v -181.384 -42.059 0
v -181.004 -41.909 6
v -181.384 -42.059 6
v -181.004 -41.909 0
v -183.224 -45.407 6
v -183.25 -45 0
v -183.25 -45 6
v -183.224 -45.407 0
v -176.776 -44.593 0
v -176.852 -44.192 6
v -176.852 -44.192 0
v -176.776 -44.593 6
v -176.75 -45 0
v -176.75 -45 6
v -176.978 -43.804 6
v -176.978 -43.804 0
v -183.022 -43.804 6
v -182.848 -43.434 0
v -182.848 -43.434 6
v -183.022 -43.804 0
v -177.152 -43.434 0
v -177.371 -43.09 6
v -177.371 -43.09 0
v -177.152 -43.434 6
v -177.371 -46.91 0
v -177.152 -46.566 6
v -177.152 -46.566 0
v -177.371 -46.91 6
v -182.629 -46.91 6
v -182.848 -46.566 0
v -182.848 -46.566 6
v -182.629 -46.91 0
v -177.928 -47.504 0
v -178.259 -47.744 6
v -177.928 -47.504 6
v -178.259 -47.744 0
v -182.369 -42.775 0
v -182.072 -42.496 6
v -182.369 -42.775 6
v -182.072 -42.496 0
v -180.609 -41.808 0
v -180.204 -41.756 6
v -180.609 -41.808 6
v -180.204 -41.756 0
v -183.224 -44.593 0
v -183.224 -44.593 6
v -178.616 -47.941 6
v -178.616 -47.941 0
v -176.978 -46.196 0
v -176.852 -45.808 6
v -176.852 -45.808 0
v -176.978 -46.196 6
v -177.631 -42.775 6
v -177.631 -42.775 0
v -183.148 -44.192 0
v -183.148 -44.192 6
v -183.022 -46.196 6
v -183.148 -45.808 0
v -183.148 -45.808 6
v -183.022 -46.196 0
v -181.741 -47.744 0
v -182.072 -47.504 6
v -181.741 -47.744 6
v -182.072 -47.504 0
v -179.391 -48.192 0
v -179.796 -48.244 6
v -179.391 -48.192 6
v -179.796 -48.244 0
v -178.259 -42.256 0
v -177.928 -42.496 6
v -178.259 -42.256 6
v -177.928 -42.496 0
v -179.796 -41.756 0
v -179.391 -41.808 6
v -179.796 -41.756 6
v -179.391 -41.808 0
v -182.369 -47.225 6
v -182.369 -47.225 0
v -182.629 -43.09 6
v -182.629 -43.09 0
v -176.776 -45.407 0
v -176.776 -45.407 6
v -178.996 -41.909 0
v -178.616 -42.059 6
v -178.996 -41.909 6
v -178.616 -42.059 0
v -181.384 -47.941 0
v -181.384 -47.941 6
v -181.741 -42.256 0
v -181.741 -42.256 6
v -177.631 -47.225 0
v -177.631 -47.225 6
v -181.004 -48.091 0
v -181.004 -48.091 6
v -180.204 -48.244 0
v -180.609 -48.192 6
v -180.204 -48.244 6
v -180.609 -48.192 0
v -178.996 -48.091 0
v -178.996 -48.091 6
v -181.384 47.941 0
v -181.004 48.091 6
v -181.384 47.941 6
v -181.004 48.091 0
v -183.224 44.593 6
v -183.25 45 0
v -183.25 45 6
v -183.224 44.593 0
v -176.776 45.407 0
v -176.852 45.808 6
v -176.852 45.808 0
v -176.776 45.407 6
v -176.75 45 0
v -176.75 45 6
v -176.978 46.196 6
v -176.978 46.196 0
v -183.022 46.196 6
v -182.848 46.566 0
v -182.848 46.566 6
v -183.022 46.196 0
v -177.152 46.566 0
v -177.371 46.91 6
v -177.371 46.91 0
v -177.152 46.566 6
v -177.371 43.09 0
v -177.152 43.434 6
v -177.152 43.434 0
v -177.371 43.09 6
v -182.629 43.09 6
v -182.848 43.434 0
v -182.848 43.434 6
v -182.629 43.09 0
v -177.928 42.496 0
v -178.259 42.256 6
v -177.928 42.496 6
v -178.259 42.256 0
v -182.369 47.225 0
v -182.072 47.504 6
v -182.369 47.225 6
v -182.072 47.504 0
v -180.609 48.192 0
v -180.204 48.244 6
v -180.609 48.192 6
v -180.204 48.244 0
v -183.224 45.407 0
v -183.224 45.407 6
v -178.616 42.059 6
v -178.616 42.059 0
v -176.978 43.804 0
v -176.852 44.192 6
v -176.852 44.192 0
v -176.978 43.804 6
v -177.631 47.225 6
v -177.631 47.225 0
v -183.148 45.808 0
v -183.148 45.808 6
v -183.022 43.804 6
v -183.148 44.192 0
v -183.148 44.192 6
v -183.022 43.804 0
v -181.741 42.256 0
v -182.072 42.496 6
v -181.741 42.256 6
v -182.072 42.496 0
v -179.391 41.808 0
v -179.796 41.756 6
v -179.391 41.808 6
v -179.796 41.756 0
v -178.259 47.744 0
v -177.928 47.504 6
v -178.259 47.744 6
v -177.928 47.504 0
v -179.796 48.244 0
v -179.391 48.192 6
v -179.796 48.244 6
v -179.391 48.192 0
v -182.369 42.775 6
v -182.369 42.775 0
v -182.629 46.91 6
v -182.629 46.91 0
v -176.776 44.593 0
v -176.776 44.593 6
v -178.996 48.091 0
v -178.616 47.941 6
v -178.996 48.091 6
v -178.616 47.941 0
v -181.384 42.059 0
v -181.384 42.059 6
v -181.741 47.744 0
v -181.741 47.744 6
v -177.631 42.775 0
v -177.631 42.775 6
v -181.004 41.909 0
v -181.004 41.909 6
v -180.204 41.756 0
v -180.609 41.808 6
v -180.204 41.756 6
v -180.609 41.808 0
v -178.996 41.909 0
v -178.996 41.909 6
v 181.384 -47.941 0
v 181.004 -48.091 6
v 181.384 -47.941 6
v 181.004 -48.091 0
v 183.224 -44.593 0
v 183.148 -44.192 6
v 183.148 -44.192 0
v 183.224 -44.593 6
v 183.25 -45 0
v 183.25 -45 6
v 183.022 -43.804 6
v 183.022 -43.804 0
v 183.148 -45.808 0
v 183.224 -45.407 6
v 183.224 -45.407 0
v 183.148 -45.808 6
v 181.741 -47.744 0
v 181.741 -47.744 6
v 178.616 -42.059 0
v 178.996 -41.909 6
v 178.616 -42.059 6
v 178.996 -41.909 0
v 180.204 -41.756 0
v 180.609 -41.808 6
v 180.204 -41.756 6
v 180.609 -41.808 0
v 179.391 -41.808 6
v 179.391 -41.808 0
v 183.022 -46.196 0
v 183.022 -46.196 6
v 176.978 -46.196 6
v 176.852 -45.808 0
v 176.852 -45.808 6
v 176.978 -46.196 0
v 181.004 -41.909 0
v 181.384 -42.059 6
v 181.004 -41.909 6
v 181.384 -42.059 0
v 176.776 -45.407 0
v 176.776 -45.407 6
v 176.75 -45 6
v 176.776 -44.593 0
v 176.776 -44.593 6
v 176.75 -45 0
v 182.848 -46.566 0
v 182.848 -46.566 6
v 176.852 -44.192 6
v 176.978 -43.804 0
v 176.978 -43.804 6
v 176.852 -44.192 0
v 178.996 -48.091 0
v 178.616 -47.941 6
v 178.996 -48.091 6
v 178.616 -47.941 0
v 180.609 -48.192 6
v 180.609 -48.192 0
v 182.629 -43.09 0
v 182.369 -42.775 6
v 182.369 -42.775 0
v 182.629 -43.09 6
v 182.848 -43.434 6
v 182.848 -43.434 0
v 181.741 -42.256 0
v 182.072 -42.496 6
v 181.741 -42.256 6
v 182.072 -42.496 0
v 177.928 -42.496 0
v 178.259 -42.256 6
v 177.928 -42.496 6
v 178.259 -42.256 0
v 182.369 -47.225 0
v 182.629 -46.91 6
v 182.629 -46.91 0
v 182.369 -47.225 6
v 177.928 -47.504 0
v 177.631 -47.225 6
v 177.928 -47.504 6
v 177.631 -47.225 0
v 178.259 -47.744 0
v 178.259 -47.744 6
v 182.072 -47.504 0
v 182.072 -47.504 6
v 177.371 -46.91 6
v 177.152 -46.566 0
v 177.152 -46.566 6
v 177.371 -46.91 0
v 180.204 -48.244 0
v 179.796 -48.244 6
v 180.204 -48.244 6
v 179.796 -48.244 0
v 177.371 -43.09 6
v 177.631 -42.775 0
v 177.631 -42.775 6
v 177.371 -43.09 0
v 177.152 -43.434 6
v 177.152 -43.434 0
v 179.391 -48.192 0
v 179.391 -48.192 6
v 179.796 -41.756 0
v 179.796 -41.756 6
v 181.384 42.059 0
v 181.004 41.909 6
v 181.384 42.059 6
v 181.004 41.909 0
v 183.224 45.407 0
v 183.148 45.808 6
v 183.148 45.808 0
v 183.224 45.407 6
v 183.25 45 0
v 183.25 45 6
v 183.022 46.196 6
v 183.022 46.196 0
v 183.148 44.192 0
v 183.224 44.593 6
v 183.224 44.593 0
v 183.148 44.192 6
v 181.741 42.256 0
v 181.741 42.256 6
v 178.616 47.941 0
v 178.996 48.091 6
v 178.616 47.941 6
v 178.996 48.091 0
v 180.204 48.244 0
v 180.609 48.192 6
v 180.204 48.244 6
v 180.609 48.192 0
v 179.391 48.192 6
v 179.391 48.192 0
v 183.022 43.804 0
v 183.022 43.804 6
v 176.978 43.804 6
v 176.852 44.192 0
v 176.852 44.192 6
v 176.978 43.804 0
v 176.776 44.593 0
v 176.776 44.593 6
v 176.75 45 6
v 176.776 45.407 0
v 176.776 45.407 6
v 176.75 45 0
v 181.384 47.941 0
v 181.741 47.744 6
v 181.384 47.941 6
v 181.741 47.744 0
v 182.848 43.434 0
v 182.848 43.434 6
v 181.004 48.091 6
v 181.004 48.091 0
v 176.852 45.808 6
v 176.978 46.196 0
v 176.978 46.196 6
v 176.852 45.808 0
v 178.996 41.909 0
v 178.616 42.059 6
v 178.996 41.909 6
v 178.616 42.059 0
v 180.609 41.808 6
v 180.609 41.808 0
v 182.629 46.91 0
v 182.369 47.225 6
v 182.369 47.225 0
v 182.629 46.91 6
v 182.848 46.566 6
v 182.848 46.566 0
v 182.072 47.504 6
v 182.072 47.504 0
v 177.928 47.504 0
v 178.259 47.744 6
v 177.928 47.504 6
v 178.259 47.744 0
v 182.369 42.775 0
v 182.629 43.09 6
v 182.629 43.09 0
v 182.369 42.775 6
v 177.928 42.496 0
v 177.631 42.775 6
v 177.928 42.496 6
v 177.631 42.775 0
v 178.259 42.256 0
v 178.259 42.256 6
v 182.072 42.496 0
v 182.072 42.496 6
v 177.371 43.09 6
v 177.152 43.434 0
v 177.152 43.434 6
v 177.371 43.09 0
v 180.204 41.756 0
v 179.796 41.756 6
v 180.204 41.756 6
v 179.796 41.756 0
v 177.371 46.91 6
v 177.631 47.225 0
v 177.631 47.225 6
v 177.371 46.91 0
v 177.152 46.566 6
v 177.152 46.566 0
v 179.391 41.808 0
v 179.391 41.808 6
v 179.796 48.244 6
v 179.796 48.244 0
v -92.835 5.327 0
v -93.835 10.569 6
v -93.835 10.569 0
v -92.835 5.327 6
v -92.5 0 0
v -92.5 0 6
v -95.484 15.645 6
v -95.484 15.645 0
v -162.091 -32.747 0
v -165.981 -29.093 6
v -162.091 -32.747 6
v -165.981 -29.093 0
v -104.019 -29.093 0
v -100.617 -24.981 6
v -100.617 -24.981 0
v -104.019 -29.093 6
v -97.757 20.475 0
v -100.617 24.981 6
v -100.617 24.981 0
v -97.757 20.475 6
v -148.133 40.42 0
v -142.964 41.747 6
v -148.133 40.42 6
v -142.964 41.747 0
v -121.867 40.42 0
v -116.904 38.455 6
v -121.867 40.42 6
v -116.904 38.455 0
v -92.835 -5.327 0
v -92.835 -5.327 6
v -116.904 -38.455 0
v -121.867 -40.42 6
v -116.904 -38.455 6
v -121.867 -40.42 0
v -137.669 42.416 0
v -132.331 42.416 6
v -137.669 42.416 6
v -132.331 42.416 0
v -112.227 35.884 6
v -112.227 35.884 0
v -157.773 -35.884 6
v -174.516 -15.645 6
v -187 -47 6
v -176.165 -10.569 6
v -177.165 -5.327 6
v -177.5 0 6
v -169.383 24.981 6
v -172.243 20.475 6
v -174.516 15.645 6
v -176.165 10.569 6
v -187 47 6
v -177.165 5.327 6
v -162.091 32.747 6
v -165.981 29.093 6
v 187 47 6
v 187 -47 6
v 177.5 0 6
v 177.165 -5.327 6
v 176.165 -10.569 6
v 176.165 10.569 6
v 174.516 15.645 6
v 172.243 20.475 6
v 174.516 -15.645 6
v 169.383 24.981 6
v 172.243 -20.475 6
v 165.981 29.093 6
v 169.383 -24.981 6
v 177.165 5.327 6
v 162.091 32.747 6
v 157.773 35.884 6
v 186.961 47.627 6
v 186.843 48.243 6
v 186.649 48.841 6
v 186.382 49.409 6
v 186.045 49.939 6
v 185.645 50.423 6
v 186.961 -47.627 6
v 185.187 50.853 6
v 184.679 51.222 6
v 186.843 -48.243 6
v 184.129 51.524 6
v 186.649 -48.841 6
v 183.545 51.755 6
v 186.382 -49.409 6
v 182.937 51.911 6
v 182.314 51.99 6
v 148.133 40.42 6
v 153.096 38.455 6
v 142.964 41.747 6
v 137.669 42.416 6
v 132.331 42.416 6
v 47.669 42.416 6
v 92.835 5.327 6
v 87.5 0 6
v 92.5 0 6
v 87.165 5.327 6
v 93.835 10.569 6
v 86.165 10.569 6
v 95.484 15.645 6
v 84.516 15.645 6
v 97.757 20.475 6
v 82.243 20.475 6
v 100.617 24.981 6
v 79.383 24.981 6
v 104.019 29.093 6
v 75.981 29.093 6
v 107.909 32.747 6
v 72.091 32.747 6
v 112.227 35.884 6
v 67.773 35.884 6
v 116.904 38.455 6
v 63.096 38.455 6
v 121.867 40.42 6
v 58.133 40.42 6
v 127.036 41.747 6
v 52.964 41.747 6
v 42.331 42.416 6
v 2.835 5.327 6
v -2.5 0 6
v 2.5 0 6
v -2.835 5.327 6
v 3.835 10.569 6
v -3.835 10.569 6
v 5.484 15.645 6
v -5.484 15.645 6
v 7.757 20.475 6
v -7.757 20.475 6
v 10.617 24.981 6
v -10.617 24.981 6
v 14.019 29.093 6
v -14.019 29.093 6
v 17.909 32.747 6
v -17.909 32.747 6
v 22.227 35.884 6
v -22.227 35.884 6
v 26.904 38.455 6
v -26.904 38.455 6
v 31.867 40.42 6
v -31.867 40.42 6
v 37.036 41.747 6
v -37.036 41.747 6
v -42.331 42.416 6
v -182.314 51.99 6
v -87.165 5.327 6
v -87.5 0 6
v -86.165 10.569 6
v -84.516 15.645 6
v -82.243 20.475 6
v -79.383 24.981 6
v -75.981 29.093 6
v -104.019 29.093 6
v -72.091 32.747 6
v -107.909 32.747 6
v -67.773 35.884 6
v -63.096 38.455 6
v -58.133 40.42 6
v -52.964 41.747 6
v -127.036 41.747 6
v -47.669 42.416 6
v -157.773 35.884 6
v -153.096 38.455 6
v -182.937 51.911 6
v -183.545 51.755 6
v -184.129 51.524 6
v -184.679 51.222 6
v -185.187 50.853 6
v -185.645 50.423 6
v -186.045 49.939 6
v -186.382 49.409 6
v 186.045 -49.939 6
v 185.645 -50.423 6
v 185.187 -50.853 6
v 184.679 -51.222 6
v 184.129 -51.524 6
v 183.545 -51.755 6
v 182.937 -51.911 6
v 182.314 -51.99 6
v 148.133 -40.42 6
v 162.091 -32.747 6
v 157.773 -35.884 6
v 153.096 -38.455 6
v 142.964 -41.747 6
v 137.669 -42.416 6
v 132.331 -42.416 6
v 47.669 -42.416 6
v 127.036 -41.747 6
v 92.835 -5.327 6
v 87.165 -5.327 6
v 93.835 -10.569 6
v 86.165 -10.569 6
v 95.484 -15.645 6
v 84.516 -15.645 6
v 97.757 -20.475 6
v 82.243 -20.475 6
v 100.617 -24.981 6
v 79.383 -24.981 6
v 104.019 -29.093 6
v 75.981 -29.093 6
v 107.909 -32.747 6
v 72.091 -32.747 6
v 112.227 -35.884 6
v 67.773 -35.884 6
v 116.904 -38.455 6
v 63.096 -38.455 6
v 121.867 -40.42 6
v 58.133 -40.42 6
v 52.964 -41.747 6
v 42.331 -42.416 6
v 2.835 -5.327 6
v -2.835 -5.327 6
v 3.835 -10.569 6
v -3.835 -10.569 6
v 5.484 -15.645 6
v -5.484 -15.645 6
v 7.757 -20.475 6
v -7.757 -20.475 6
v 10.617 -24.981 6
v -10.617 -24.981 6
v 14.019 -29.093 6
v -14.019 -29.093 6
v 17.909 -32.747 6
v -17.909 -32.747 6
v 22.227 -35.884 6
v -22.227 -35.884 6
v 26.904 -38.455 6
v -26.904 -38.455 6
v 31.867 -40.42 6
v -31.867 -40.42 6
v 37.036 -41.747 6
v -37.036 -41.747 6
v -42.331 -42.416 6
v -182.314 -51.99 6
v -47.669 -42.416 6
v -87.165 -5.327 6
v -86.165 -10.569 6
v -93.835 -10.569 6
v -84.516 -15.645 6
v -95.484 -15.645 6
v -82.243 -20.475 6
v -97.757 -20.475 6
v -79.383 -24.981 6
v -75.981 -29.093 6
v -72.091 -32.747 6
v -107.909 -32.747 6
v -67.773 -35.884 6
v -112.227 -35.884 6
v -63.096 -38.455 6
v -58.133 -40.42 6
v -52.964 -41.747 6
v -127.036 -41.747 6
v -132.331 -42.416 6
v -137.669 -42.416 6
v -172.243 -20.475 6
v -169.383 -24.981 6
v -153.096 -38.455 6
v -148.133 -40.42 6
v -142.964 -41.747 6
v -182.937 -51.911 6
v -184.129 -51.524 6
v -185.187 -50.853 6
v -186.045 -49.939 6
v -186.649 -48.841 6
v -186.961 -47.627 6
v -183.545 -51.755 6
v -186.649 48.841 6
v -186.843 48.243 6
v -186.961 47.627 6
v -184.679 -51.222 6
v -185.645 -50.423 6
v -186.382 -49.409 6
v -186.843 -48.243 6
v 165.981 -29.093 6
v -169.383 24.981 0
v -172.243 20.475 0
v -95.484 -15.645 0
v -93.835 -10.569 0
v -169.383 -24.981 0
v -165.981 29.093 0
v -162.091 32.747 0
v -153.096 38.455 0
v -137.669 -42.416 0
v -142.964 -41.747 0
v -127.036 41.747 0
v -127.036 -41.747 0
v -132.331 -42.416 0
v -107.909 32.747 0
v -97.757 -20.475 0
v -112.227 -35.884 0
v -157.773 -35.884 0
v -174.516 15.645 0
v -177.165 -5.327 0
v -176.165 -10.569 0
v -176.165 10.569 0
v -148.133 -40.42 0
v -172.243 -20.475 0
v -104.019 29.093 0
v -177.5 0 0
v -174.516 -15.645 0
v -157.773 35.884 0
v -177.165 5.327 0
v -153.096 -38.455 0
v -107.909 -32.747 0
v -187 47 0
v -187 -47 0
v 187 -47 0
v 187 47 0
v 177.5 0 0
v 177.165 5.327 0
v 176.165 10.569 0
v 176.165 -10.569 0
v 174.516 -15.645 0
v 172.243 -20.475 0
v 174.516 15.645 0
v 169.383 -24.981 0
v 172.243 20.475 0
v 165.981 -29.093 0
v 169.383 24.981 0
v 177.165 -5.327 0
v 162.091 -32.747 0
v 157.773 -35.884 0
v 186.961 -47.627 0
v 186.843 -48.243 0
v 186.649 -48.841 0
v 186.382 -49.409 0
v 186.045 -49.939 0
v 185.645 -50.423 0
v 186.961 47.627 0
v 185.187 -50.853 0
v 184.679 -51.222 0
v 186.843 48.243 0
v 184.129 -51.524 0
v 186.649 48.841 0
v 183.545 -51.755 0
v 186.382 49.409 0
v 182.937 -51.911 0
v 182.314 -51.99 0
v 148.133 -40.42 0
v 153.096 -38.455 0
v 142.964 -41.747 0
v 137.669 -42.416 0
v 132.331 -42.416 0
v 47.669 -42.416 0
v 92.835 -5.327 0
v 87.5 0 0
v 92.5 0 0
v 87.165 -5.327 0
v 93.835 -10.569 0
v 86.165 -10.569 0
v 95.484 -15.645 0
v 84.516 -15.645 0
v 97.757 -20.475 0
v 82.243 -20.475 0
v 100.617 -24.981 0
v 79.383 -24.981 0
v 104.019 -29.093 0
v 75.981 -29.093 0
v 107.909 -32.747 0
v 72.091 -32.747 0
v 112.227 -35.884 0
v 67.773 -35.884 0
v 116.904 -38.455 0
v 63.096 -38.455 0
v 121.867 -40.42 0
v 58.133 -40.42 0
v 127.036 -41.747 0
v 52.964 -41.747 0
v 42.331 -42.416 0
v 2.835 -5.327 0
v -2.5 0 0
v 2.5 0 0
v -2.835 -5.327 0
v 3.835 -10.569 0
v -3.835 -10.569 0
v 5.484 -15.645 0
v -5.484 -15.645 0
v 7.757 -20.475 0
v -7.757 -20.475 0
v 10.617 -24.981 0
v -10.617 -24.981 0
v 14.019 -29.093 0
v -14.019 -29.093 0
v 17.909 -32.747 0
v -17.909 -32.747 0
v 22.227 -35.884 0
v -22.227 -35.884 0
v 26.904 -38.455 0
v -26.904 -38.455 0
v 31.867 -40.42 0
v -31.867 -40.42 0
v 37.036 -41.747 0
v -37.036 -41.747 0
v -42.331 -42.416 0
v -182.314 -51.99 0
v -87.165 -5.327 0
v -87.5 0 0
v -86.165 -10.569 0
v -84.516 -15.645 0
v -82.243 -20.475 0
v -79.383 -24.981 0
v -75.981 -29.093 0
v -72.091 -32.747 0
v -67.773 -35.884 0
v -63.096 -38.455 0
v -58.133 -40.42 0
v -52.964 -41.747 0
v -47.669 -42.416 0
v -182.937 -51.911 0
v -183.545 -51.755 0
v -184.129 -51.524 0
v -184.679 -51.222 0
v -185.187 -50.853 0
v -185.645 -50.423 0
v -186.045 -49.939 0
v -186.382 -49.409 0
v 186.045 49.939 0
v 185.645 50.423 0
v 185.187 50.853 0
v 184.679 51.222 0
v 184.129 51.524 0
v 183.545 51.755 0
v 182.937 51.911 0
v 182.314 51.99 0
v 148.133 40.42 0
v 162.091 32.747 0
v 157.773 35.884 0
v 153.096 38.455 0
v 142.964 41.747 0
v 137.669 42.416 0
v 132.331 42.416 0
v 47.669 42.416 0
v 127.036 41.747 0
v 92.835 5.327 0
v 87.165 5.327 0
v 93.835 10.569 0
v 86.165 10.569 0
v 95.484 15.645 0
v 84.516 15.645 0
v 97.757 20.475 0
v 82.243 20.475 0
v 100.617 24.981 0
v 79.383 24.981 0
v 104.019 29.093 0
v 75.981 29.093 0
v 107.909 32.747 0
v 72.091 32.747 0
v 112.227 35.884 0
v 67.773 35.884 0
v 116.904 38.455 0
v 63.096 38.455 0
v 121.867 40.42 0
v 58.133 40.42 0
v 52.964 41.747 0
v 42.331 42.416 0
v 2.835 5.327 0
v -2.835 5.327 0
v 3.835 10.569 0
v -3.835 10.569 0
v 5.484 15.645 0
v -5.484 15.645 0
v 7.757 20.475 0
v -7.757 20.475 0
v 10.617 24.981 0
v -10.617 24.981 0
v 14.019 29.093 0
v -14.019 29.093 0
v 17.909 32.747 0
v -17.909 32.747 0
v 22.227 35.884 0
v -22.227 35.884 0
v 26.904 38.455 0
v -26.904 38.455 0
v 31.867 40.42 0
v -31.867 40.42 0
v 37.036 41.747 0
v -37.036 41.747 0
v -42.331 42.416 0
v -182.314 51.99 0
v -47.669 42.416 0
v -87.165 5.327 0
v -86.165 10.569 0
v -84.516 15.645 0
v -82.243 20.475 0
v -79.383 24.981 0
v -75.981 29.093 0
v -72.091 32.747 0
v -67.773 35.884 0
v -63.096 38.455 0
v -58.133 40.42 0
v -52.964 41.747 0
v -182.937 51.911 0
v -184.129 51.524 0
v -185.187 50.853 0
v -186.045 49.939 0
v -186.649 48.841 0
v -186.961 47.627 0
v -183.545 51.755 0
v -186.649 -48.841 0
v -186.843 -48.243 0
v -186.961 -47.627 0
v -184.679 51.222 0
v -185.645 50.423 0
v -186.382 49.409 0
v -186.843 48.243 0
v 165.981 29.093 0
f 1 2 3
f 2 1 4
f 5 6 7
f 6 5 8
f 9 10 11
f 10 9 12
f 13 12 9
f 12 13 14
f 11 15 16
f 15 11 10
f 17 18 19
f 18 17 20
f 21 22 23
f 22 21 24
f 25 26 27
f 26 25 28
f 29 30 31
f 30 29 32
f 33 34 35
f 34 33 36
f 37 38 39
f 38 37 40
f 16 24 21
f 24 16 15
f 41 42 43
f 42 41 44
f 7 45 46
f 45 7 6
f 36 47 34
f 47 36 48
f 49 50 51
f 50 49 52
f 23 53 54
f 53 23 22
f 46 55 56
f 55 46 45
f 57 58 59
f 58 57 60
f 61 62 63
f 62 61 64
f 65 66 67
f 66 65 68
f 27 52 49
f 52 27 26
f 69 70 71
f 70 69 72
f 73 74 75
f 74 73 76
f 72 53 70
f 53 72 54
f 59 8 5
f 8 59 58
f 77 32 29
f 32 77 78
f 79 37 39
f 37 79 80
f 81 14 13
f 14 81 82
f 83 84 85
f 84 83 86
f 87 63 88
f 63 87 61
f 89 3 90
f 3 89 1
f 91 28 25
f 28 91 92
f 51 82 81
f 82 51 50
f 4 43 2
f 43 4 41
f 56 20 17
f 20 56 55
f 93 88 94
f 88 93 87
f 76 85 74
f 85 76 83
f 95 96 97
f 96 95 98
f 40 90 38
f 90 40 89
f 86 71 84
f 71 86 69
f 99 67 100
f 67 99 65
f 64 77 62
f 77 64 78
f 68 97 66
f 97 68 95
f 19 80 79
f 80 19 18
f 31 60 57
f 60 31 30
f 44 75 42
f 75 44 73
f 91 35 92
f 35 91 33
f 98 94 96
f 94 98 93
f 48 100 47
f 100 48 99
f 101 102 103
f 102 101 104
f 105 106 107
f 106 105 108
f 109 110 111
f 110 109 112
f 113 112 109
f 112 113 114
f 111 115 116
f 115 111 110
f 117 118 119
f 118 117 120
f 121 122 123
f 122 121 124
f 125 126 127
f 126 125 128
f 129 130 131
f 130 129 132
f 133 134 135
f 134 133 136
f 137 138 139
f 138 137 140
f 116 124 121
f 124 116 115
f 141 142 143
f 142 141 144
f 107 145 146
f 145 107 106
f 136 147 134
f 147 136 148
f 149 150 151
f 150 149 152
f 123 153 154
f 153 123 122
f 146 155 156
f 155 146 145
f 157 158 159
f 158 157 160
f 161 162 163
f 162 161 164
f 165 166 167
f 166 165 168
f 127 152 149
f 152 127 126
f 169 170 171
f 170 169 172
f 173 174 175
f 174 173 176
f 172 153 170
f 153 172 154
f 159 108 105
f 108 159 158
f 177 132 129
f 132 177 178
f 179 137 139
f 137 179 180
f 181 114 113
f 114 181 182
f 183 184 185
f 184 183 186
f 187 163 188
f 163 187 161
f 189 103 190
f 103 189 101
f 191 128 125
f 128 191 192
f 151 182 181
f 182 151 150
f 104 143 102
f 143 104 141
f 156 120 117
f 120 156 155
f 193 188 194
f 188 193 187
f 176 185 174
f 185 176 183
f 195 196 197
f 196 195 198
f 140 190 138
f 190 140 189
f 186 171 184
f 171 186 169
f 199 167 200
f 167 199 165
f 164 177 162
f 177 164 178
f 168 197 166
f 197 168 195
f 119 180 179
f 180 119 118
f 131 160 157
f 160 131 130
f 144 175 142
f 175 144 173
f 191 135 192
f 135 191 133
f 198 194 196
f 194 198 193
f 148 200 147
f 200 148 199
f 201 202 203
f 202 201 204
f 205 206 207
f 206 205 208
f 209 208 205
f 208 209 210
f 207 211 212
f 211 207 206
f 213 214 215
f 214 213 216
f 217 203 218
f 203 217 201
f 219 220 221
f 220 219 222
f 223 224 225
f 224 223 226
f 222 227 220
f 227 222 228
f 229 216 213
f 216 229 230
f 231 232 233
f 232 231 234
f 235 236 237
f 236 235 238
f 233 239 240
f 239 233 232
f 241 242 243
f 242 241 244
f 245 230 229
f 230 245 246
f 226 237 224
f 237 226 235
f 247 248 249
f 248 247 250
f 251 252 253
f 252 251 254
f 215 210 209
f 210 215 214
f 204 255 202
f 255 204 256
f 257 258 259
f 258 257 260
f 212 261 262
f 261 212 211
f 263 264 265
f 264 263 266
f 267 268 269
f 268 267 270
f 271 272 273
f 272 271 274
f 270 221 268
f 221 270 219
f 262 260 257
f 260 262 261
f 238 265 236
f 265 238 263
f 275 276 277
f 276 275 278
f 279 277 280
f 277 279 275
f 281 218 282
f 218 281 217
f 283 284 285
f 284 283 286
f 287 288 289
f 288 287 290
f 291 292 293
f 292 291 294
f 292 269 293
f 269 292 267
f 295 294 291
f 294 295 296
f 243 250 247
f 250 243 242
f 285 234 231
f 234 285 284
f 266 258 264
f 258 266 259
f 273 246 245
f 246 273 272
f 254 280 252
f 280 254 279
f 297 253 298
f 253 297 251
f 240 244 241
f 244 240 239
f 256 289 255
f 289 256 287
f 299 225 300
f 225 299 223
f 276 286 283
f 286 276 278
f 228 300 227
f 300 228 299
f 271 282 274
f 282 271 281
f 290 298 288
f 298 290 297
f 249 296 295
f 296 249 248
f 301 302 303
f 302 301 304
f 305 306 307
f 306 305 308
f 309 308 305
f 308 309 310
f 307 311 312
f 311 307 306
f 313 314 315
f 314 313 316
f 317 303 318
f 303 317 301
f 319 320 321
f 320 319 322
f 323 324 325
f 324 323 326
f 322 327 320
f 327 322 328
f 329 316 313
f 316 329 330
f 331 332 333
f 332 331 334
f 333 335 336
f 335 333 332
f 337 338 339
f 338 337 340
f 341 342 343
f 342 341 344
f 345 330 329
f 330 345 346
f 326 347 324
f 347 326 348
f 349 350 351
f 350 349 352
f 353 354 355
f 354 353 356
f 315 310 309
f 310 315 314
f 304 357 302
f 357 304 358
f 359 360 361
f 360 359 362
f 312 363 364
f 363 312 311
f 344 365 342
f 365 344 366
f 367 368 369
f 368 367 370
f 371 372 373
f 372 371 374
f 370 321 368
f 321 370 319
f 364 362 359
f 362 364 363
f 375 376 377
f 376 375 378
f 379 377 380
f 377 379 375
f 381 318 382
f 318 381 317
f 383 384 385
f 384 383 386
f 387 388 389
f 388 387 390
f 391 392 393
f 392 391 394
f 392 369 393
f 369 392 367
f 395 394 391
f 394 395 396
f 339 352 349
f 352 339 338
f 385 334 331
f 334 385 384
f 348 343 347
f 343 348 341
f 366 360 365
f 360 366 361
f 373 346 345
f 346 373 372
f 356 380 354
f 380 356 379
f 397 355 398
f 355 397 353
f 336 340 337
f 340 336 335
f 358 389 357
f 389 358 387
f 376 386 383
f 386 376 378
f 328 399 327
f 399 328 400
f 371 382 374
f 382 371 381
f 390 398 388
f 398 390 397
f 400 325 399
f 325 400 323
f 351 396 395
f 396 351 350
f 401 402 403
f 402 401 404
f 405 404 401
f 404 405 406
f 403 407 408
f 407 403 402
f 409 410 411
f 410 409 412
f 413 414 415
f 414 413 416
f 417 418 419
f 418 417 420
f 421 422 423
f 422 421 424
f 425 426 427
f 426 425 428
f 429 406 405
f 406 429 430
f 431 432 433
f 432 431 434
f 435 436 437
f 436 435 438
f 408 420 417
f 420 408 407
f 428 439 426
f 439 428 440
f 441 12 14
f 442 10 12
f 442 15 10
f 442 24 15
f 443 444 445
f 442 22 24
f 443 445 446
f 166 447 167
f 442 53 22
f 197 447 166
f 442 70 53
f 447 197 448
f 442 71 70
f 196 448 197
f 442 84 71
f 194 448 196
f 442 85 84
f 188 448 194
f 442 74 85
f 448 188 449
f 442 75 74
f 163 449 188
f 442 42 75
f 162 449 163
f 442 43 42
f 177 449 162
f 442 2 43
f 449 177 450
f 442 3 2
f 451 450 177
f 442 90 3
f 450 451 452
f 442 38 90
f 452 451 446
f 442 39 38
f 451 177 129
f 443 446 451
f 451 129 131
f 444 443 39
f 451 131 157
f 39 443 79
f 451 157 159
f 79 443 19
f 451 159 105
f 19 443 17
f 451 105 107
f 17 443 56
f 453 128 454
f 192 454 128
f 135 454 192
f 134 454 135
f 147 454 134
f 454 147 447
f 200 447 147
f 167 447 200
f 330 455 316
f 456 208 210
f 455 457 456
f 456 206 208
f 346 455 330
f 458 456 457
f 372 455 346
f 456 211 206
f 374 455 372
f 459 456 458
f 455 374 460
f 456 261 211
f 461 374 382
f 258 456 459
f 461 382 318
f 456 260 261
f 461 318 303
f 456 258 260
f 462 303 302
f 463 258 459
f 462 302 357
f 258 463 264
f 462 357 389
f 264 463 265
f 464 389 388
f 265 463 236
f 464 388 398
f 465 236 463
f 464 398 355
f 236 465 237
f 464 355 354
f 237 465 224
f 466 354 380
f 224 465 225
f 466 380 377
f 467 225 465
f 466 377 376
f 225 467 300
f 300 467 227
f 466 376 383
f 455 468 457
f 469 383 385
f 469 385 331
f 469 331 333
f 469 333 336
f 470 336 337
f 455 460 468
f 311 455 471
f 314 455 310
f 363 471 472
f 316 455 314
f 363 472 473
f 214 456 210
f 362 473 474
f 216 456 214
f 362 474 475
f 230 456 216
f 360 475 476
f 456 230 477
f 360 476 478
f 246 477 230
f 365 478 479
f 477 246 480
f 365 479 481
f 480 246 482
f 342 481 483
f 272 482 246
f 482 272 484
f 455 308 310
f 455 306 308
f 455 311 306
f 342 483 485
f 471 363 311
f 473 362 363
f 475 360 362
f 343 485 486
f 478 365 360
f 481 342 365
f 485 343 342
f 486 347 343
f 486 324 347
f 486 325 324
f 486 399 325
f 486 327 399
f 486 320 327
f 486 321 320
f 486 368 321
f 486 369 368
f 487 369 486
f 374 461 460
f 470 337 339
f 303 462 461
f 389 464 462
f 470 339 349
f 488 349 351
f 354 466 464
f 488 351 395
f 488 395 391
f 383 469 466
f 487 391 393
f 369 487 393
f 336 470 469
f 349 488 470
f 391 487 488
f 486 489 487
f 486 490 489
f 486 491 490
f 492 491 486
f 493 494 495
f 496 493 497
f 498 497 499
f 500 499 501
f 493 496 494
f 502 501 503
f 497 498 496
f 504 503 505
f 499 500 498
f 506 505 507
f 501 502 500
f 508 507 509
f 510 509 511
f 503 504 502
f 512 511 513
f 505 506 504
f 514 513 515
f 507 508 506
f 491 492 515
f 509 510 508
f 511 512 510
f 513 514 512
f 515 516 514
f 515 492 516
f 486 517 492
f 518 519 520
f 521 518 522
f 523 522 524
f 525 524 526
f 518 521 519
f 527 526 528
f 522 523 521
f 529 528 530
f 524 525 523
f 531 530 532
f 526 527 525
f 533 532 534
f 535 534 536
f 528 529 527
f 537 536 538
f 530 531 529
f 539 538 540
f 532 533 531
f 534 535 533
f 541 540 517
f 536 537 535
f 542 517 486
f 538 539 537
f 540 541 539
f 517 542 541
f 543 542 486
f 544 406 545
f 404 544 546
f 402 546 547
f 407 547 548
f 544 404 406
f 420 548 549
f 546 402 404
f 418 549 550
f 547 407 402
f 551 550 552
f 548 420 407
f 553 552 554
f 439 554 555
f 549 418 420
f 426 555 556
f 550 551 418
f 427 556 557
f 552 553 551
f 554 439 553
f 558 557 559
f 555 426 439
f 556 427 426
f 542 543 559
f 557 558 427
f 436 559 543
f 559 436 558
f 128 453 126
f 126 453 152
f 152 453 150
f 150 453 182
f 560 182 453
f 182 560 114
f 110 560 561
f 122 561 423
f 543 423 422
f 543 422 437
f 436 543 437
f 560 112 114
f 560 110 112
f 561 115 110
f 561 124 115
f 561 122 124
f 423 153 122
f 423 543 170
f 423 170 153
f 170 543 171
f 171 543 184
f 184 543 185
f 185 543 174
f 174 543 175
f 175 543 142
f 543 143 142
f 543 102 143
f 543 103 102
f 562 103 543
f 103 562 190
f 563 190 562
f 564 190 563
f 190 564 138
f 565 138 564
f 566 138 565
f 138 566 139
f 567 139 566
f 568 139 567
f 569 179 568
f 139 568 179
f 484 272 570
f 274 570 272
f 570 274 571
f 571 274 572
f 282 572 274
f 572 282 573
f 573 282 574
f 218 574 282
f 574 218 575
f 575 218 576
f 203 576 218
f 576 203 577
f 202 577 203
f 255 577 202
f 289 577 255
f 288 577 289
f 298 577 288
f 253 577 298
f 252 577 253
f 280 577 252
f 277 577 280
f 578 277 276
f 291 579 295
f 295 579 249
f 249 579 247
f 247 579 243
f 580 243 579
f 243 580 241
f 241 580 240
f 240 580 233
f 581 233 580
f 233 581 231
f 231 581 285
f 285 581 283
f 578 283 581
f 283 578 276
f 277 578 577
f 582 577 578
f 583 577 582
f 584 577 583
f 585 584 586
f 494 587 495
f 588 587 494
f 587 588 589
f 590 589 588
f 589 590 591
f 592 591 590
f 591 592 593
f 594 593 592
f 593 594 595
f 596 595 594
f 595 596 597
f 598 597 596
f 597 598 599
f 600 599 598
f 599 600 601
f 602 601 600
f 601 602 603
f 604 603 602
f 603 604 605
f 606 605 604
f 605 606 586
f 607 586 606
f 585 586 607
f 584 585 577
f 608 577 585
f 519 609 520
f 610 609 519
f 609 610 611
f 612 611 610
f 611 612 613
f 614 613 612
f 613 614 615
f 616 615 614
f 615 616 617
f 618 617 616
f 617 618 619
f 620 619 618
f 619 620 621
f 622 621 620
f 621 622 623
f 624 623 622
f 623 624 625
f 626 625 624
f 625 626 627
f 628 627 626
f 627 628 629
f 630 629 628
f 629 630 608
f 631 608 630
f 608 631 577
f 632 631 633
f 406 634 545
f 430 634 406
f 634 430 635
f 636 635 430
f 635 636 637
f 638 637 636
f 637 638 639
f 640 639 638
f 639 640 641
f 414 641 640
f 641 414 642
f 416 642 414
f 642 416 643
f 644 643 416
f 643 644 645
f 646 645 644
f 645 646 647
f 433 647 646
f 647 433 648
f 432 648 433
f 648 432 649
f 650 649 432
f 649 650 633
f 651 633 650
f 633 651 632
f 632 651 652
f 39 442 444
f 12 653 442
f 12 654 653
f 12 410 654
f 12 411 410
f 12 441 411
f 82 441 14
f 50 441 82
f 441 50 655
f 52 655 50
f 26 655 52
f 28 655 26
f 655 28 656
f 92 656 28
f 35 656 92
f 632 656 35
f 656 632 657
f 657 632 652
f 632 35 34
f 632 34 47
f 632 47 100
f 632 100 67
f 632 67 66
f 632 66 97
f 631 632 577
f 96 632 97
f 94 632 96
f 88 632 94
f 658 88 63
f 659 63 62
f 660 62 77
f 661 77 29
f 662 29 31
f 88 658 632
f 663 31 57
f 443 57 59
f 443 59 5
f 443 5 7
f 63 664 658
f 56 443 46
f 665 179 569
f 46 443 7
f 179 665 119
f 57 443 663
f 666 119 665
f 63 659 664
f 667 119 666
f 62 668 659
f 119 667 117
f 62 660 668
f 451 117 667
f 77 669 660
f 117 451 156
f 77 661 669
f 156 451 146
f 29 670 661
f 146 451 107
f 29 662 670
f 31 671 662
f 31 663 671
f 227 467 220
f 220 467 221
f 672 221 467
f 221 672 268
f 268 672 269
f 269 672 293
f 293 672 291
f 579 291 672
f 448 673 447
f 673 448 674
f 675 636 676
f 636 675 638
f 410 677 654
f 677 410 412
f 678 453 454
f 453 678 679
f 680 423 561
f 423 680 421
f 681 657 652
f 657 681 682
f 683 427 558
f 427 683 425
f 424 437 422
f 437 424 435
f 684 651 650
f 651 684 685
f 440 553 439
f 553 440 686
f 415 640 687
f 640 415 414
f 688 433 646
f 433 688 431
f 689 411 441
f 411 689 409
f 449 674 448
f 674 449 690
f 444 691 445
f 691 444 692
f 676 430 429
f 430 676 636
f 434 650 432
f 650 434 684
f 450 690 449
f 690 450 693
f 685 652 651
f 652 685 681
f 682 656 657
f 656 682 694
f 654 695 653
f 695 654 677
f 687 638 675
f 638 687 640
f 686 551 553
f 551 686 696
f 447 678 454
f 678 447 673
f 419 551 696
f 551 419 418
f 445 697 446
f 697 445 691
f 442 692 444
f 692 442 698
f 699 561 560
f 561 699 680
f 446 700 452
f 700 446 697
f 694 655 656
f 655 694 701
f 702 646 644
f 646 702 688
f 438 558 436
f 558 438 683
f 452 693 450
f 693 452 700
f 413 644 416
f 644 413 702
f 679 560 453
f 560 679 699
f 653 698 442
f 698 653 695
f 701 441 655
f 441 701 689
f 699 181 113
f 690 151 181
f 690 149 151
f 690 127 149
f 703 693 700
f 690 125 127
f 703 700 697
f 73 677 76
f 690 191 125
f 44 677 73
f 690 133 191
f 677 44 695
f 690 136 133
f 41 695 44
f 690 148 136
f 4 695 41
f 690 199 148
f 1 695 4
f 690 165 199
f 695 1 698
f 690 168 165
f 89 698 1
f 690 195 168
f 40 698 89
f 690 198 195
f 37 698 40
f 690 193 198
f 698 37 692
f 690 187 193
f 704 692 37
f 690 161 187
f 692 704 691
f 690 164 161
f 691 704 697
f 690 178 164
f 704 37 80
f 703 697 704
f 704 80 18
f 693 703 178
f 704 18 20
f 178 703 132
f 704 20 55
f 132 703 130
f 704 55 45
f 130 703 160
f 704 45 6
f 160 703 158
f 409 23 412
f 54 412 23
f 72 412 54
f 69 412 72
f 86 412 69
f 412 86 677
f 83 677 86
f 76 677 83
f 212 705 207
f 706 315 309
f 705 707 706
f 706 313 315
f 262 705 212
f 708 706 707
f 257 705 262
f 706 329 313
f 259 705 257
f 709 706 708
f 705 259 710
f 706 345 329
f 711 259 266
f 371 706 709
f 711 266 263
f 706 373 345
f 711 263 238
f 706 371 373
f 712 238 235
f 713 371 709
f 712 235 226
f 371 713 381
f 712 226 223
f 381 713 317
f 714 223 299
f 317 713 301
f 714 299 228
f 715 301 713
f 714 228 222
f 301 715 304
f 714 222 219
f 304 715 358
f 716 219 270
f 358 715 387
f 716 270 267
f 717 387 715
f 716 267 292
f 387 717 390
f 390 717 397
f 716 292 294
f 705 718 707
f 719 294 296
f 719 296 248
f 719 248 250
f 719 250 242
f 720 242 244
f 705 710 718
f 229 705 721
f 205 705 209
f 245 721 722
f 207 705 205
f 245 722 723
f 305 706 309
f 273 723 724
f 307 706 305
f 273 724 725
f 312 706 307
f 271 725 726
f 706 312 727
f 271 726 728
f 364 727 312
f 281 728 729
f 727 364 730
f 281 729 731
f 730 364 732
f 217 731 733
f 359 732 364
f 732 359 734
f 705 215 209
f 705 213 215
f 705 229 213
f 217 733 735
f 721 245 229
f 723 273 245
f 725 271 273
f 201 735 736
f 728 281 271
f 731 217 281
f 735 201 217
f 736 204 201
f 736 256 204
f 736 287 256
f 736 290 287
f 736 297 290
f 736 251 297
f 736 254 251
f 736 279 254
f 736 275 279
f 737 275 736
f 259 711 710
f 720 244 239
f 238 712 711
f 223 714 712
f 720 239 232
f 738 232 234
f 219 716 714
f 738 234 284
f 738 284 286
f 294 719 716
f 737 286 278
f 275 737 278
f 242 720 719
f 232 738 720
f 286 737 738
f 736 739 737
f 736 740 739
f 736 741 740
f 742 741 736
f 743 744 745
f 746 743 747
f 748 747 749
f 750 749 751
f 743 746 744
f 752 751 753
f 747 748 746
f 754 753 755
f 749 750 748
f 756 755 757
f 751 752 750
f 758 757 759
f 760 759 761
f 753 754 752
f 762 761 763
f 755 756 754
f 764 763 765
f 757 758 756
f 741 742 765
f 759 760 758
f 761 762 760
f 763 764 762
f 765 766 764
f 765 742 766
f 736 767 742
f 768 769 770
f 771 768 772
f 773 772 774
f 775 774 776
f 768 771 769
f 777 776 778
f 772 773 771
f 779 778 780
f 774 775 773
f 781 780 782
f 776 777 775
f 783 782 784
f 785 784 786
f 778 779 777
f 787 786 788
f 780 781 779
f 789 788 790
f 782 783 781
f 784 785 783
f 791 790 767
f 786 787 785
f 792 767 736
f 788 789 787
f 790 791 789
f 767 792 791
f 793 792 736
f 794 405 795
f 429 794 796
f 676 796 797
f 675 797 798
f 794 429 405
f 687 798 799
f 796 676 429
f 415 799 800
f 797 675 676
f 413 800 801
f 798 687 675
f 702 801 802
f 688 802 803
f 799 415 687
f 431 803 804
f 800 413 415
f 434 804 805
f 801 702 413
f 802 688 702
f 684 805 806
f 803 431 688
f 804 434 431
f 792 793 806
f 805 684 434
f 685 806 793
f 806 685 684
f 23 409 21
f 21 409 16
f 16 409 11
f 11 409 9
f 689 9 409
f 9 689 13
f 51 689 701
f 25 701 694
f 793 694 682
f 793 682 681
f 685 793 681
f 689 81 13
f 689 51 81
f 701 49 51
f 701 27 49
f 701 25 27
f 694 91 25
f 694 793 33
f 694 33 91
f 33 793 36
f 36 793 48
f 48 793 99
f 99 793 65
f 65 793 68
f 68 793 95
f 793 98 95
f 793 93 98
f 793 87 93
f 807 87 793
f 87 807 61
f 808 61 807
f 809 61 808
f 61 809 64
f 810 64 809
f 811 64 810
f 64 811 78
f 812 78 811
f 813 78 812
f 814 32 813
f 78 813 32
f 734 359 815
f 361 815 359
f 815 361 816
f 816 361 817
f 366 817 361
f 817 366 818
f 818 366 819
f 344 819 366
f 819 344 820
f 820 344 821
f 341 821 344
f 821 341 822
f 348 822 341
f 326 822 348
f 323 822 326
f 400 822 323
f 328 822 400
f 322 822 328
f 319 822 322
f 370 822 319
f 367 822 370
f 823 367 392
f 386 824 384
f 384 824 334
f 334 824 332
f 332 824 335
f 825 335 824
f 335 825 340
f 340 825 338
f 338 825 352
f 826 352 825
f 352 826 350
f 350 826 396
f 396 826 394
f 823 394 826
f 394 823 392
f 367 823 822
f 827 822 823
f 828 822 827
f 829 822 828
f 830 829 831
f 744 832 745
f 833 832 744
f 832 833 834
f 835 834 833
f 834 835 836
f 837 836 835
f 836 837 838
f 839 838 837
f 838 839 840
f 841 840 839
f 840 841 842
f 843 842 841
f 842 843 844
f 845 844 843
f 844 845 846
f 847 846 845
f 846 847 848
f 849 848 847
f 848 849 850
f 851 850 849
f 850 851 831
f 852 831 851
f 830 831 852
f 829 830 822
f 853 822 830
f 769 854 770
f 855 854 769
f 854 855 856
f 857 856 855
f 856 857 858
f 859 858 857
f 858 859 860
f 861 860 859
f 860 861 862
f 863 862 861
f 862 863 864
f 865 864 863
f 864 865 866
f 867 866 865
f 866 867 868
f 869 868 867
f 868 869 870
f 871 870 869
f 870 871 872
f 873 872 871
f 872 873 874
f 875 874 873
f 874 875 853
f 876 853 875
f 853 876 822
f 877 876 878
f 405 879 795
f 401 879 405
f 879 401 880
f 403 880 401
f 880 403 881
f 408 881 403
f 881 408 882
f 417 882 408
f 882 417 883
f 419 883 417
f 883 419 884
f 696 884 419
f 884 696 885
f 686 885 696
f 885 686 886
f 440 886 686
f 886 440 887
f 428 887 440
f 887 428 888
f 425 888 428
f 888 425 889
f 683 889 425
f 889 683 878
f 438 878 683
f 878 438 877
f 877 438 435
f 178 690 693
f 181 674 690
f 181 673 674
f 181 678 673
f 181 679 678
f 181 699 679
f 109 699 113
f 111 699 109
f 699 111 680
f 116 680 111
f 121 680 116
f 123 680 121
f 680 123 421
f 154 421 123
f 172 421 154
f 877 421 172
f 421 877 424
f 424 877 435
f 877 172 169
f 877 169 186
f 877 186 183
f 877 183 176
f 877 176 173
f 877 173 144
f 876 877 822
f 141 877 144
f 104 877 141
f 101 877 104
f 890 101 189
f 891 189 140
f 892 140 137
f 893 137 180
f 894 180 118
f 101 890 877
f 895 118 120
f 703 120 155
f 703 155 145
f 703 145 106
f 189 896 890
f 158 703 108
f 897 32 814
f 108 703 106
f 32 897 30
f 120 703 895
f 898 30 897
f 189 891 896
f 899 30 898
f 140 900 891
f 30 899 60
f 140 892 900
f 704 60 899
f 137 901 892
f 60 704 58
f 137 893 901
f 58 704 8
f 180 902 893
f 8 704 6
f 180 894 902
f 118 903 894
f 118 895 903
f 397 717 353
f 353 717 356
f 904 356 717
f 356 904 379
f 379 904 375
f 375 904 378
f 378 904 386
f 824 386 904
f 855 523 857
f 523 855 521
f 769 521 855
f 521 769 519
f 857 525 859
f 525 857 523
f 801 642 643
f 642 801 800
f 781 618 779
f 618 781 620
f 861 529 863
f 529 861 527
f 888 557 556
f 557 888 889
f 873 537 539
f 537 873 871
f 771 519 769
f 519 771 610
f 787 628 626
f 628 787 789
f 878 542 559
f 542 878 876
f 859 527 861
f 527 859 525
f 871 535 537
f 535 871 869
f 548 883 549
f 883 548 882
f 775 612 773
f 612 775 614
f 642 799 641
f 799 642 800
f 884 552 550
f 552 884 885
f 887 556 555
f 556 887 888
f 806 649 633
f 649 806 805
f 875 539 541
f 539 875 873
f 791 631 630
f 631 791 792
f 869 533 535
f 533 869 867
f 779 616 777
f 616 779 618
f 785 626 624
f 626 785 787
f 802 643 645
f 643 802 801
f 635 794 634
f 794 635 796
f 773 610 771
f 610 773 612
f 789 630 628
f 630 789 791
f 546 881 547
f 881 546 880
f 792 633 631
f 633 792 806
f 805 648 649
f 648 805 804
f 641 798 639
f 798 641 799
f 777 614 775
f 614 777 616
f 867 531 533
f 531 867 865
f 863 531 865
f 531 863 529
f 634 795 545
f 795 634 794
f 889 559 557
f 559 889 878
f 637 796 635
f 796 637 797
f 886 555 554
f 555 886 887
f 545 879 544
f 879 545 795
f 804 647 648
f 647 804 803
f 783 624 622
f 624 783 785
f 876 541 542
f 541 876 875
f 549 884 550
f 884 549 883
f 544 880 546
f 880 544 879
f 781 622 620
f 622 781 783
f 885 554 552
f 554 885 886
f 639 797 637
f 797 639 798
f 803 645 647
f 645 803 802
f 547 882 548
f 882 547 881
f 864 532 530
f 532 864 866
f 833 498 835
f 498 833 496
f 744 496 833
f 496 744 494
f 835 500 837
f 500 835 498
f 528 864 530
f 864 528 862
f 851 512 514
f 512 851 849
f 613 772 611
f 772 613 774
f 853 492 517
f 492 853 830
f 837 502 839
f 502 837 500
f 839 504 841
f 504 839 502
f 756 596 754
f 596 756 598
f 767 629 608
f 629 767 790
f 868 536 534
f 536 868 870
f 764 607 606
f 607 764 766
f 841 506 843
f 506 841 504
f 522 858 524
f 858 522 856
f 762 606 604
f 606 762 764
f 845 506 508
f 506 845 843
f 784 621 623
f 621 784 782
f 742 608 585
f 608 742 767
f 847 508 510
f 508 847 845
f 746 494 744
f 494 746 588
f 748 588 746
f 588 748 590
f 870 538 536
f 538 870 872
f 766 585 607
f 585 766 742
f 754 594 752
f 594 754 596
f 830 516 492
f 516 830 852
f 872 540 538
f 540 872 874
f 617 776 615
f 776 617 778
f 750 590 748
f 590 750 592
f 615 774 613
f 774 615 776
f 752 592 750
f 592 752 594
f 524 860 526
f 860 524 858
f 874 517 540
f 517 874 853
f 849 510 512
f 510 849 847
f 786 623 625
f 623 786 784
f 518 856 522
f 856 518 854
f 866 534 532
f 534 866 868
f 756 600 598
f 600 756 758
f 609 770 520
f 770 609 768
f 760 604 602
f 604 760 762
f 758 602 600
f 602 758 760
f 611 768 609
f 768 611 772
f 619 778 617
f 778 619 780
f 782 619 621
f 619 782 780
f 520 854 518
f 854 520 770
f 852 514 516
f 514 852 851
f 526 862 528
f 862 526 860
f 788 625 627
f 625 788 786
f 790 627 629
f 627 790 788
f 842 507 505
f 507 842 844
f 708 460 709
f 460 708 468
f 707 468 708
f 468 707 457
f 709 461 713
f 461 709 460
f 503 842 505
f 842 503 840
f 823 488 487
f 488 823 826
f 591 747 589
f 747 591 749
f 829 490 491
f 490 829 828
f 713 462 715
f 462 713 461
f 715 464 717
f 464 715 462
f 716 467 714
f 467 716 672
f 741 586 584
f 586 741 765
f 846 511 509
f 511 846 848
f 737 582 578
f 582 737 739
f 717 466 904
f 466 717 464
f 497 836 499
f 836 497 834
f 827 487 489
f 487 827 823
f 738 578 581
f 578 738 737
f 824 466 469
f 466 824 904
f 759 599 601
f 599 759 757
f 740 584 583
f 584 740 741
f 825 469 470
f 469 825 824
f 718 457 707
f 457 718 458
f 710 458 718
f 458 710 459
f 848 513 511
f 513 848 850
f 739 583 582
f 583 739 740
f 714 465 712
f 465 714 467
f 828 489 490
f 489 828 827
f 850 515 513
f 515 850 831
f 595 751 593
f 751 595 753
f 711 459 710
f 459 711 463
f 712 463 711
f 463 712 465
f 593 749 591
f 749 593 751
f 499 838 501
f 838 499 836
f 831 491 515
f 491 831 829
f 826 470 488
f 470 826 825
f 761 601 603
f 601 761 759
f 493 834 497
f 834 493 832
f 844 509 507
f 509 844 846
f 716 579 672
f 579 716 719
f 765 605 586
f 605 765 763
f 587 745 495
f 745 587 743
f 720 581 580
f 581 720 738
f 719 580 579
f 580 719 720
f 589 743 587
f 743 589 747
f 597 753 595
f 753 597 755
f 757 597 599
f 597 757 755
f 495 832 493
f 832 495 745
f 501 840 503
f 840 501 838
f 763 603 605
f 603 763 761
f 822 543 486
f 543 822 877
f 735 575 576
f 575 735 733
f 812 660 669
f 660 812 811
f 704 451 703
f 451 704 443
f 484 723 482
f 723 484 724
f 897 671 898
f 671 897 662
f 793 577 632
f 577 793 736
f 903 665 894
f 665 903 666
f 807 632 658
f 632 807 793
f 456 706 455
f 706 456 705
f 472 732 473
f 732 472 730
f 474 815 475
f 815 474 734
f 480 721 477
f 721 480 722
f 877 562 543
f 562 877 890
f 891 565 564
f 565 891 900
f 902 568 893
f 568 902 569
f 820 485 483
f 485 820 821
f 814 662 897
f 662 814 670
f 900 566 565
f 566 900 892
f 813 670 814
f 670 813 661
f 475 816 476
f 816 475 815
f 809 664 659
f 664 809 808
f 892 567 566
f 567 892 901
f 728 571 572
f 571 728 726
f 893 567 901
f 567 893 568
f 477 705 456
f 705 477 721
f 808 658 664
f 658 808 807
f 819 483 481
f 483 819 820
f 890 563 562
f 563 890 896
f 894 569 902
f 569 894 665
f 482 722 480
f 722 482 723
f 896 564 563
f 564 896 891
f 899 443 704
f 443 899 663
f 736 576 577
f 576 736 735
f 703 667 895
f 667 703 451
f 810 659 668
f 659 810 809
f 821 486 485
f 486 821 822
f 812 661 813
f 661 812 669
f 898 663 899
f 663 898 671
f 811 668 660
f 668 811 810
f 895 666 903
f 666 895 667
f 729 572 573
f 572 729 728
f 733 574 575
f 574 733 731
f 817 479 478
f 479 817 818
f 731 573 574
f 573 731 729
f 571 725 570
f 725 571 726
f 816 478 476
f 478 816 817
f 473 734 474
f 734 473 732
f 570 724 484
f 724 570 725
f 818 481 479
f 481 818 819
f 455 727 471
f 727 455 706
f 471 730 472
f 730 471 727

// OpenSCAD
$fn = 50;


difference() {
	union() {
		hull() {
			translate(v = [-182.0000000000, 47.0000000000, 0]) {
				cylinder(h = 6, r = 5);
			}
			translate(v = [182.0000000000, 47.0000000000, 0]) {
				cylinder(h = 6, r = 5);
			}
			translate(v = [-182.0000000000, -47.0000000000, 0]) {
				cylinder(h = 6, r = 5);
			}
			translate(v = [182.0000000000, -47.0000000000, 0]) {
				cylinder(h = 6, r = 5);
			}
		}
	}
	union() {
		#translate(v = [-180.0000000000, -45.0000000000, -100.0000000000]) {
			cylinder(h = 200, r = 3.2500000000);
		}
		#translate(v = [-180.0000000000, 45.0000000000, -100.0000000000]) {
			cylinder(h = 200, r = 3.2500000000);
		}
		#translate(v = [180.0000000000, -45.0000000000, -100.0000000000]) {
			cylinder(h = 200, r = 3.2500000000);
		}
		#translate(v = [180.0000000000, 45.0000000000, -100.0000000000]) {
			cylinder(h = 200, r = 3.2500000000);
		}
		#translate(v = [-135.0000000000, 0, 0]) {
			cylinder(h = 6, r = 42.5000000000);
		}
		#translate(v = [-45.0000000000, 0, 0]) {
			cylinder(h = 6, r = 42.5000000000);
		}
		#translate(v = [45.0000000000, 0, 0]) {
			cylinder(h = 6, r = 42.5000000000);
		}
		#translate(v = [135.0000000000, 0, 0]) {
			cylinder(h = 6, r = 42.5000000000);
		}
	}
}
